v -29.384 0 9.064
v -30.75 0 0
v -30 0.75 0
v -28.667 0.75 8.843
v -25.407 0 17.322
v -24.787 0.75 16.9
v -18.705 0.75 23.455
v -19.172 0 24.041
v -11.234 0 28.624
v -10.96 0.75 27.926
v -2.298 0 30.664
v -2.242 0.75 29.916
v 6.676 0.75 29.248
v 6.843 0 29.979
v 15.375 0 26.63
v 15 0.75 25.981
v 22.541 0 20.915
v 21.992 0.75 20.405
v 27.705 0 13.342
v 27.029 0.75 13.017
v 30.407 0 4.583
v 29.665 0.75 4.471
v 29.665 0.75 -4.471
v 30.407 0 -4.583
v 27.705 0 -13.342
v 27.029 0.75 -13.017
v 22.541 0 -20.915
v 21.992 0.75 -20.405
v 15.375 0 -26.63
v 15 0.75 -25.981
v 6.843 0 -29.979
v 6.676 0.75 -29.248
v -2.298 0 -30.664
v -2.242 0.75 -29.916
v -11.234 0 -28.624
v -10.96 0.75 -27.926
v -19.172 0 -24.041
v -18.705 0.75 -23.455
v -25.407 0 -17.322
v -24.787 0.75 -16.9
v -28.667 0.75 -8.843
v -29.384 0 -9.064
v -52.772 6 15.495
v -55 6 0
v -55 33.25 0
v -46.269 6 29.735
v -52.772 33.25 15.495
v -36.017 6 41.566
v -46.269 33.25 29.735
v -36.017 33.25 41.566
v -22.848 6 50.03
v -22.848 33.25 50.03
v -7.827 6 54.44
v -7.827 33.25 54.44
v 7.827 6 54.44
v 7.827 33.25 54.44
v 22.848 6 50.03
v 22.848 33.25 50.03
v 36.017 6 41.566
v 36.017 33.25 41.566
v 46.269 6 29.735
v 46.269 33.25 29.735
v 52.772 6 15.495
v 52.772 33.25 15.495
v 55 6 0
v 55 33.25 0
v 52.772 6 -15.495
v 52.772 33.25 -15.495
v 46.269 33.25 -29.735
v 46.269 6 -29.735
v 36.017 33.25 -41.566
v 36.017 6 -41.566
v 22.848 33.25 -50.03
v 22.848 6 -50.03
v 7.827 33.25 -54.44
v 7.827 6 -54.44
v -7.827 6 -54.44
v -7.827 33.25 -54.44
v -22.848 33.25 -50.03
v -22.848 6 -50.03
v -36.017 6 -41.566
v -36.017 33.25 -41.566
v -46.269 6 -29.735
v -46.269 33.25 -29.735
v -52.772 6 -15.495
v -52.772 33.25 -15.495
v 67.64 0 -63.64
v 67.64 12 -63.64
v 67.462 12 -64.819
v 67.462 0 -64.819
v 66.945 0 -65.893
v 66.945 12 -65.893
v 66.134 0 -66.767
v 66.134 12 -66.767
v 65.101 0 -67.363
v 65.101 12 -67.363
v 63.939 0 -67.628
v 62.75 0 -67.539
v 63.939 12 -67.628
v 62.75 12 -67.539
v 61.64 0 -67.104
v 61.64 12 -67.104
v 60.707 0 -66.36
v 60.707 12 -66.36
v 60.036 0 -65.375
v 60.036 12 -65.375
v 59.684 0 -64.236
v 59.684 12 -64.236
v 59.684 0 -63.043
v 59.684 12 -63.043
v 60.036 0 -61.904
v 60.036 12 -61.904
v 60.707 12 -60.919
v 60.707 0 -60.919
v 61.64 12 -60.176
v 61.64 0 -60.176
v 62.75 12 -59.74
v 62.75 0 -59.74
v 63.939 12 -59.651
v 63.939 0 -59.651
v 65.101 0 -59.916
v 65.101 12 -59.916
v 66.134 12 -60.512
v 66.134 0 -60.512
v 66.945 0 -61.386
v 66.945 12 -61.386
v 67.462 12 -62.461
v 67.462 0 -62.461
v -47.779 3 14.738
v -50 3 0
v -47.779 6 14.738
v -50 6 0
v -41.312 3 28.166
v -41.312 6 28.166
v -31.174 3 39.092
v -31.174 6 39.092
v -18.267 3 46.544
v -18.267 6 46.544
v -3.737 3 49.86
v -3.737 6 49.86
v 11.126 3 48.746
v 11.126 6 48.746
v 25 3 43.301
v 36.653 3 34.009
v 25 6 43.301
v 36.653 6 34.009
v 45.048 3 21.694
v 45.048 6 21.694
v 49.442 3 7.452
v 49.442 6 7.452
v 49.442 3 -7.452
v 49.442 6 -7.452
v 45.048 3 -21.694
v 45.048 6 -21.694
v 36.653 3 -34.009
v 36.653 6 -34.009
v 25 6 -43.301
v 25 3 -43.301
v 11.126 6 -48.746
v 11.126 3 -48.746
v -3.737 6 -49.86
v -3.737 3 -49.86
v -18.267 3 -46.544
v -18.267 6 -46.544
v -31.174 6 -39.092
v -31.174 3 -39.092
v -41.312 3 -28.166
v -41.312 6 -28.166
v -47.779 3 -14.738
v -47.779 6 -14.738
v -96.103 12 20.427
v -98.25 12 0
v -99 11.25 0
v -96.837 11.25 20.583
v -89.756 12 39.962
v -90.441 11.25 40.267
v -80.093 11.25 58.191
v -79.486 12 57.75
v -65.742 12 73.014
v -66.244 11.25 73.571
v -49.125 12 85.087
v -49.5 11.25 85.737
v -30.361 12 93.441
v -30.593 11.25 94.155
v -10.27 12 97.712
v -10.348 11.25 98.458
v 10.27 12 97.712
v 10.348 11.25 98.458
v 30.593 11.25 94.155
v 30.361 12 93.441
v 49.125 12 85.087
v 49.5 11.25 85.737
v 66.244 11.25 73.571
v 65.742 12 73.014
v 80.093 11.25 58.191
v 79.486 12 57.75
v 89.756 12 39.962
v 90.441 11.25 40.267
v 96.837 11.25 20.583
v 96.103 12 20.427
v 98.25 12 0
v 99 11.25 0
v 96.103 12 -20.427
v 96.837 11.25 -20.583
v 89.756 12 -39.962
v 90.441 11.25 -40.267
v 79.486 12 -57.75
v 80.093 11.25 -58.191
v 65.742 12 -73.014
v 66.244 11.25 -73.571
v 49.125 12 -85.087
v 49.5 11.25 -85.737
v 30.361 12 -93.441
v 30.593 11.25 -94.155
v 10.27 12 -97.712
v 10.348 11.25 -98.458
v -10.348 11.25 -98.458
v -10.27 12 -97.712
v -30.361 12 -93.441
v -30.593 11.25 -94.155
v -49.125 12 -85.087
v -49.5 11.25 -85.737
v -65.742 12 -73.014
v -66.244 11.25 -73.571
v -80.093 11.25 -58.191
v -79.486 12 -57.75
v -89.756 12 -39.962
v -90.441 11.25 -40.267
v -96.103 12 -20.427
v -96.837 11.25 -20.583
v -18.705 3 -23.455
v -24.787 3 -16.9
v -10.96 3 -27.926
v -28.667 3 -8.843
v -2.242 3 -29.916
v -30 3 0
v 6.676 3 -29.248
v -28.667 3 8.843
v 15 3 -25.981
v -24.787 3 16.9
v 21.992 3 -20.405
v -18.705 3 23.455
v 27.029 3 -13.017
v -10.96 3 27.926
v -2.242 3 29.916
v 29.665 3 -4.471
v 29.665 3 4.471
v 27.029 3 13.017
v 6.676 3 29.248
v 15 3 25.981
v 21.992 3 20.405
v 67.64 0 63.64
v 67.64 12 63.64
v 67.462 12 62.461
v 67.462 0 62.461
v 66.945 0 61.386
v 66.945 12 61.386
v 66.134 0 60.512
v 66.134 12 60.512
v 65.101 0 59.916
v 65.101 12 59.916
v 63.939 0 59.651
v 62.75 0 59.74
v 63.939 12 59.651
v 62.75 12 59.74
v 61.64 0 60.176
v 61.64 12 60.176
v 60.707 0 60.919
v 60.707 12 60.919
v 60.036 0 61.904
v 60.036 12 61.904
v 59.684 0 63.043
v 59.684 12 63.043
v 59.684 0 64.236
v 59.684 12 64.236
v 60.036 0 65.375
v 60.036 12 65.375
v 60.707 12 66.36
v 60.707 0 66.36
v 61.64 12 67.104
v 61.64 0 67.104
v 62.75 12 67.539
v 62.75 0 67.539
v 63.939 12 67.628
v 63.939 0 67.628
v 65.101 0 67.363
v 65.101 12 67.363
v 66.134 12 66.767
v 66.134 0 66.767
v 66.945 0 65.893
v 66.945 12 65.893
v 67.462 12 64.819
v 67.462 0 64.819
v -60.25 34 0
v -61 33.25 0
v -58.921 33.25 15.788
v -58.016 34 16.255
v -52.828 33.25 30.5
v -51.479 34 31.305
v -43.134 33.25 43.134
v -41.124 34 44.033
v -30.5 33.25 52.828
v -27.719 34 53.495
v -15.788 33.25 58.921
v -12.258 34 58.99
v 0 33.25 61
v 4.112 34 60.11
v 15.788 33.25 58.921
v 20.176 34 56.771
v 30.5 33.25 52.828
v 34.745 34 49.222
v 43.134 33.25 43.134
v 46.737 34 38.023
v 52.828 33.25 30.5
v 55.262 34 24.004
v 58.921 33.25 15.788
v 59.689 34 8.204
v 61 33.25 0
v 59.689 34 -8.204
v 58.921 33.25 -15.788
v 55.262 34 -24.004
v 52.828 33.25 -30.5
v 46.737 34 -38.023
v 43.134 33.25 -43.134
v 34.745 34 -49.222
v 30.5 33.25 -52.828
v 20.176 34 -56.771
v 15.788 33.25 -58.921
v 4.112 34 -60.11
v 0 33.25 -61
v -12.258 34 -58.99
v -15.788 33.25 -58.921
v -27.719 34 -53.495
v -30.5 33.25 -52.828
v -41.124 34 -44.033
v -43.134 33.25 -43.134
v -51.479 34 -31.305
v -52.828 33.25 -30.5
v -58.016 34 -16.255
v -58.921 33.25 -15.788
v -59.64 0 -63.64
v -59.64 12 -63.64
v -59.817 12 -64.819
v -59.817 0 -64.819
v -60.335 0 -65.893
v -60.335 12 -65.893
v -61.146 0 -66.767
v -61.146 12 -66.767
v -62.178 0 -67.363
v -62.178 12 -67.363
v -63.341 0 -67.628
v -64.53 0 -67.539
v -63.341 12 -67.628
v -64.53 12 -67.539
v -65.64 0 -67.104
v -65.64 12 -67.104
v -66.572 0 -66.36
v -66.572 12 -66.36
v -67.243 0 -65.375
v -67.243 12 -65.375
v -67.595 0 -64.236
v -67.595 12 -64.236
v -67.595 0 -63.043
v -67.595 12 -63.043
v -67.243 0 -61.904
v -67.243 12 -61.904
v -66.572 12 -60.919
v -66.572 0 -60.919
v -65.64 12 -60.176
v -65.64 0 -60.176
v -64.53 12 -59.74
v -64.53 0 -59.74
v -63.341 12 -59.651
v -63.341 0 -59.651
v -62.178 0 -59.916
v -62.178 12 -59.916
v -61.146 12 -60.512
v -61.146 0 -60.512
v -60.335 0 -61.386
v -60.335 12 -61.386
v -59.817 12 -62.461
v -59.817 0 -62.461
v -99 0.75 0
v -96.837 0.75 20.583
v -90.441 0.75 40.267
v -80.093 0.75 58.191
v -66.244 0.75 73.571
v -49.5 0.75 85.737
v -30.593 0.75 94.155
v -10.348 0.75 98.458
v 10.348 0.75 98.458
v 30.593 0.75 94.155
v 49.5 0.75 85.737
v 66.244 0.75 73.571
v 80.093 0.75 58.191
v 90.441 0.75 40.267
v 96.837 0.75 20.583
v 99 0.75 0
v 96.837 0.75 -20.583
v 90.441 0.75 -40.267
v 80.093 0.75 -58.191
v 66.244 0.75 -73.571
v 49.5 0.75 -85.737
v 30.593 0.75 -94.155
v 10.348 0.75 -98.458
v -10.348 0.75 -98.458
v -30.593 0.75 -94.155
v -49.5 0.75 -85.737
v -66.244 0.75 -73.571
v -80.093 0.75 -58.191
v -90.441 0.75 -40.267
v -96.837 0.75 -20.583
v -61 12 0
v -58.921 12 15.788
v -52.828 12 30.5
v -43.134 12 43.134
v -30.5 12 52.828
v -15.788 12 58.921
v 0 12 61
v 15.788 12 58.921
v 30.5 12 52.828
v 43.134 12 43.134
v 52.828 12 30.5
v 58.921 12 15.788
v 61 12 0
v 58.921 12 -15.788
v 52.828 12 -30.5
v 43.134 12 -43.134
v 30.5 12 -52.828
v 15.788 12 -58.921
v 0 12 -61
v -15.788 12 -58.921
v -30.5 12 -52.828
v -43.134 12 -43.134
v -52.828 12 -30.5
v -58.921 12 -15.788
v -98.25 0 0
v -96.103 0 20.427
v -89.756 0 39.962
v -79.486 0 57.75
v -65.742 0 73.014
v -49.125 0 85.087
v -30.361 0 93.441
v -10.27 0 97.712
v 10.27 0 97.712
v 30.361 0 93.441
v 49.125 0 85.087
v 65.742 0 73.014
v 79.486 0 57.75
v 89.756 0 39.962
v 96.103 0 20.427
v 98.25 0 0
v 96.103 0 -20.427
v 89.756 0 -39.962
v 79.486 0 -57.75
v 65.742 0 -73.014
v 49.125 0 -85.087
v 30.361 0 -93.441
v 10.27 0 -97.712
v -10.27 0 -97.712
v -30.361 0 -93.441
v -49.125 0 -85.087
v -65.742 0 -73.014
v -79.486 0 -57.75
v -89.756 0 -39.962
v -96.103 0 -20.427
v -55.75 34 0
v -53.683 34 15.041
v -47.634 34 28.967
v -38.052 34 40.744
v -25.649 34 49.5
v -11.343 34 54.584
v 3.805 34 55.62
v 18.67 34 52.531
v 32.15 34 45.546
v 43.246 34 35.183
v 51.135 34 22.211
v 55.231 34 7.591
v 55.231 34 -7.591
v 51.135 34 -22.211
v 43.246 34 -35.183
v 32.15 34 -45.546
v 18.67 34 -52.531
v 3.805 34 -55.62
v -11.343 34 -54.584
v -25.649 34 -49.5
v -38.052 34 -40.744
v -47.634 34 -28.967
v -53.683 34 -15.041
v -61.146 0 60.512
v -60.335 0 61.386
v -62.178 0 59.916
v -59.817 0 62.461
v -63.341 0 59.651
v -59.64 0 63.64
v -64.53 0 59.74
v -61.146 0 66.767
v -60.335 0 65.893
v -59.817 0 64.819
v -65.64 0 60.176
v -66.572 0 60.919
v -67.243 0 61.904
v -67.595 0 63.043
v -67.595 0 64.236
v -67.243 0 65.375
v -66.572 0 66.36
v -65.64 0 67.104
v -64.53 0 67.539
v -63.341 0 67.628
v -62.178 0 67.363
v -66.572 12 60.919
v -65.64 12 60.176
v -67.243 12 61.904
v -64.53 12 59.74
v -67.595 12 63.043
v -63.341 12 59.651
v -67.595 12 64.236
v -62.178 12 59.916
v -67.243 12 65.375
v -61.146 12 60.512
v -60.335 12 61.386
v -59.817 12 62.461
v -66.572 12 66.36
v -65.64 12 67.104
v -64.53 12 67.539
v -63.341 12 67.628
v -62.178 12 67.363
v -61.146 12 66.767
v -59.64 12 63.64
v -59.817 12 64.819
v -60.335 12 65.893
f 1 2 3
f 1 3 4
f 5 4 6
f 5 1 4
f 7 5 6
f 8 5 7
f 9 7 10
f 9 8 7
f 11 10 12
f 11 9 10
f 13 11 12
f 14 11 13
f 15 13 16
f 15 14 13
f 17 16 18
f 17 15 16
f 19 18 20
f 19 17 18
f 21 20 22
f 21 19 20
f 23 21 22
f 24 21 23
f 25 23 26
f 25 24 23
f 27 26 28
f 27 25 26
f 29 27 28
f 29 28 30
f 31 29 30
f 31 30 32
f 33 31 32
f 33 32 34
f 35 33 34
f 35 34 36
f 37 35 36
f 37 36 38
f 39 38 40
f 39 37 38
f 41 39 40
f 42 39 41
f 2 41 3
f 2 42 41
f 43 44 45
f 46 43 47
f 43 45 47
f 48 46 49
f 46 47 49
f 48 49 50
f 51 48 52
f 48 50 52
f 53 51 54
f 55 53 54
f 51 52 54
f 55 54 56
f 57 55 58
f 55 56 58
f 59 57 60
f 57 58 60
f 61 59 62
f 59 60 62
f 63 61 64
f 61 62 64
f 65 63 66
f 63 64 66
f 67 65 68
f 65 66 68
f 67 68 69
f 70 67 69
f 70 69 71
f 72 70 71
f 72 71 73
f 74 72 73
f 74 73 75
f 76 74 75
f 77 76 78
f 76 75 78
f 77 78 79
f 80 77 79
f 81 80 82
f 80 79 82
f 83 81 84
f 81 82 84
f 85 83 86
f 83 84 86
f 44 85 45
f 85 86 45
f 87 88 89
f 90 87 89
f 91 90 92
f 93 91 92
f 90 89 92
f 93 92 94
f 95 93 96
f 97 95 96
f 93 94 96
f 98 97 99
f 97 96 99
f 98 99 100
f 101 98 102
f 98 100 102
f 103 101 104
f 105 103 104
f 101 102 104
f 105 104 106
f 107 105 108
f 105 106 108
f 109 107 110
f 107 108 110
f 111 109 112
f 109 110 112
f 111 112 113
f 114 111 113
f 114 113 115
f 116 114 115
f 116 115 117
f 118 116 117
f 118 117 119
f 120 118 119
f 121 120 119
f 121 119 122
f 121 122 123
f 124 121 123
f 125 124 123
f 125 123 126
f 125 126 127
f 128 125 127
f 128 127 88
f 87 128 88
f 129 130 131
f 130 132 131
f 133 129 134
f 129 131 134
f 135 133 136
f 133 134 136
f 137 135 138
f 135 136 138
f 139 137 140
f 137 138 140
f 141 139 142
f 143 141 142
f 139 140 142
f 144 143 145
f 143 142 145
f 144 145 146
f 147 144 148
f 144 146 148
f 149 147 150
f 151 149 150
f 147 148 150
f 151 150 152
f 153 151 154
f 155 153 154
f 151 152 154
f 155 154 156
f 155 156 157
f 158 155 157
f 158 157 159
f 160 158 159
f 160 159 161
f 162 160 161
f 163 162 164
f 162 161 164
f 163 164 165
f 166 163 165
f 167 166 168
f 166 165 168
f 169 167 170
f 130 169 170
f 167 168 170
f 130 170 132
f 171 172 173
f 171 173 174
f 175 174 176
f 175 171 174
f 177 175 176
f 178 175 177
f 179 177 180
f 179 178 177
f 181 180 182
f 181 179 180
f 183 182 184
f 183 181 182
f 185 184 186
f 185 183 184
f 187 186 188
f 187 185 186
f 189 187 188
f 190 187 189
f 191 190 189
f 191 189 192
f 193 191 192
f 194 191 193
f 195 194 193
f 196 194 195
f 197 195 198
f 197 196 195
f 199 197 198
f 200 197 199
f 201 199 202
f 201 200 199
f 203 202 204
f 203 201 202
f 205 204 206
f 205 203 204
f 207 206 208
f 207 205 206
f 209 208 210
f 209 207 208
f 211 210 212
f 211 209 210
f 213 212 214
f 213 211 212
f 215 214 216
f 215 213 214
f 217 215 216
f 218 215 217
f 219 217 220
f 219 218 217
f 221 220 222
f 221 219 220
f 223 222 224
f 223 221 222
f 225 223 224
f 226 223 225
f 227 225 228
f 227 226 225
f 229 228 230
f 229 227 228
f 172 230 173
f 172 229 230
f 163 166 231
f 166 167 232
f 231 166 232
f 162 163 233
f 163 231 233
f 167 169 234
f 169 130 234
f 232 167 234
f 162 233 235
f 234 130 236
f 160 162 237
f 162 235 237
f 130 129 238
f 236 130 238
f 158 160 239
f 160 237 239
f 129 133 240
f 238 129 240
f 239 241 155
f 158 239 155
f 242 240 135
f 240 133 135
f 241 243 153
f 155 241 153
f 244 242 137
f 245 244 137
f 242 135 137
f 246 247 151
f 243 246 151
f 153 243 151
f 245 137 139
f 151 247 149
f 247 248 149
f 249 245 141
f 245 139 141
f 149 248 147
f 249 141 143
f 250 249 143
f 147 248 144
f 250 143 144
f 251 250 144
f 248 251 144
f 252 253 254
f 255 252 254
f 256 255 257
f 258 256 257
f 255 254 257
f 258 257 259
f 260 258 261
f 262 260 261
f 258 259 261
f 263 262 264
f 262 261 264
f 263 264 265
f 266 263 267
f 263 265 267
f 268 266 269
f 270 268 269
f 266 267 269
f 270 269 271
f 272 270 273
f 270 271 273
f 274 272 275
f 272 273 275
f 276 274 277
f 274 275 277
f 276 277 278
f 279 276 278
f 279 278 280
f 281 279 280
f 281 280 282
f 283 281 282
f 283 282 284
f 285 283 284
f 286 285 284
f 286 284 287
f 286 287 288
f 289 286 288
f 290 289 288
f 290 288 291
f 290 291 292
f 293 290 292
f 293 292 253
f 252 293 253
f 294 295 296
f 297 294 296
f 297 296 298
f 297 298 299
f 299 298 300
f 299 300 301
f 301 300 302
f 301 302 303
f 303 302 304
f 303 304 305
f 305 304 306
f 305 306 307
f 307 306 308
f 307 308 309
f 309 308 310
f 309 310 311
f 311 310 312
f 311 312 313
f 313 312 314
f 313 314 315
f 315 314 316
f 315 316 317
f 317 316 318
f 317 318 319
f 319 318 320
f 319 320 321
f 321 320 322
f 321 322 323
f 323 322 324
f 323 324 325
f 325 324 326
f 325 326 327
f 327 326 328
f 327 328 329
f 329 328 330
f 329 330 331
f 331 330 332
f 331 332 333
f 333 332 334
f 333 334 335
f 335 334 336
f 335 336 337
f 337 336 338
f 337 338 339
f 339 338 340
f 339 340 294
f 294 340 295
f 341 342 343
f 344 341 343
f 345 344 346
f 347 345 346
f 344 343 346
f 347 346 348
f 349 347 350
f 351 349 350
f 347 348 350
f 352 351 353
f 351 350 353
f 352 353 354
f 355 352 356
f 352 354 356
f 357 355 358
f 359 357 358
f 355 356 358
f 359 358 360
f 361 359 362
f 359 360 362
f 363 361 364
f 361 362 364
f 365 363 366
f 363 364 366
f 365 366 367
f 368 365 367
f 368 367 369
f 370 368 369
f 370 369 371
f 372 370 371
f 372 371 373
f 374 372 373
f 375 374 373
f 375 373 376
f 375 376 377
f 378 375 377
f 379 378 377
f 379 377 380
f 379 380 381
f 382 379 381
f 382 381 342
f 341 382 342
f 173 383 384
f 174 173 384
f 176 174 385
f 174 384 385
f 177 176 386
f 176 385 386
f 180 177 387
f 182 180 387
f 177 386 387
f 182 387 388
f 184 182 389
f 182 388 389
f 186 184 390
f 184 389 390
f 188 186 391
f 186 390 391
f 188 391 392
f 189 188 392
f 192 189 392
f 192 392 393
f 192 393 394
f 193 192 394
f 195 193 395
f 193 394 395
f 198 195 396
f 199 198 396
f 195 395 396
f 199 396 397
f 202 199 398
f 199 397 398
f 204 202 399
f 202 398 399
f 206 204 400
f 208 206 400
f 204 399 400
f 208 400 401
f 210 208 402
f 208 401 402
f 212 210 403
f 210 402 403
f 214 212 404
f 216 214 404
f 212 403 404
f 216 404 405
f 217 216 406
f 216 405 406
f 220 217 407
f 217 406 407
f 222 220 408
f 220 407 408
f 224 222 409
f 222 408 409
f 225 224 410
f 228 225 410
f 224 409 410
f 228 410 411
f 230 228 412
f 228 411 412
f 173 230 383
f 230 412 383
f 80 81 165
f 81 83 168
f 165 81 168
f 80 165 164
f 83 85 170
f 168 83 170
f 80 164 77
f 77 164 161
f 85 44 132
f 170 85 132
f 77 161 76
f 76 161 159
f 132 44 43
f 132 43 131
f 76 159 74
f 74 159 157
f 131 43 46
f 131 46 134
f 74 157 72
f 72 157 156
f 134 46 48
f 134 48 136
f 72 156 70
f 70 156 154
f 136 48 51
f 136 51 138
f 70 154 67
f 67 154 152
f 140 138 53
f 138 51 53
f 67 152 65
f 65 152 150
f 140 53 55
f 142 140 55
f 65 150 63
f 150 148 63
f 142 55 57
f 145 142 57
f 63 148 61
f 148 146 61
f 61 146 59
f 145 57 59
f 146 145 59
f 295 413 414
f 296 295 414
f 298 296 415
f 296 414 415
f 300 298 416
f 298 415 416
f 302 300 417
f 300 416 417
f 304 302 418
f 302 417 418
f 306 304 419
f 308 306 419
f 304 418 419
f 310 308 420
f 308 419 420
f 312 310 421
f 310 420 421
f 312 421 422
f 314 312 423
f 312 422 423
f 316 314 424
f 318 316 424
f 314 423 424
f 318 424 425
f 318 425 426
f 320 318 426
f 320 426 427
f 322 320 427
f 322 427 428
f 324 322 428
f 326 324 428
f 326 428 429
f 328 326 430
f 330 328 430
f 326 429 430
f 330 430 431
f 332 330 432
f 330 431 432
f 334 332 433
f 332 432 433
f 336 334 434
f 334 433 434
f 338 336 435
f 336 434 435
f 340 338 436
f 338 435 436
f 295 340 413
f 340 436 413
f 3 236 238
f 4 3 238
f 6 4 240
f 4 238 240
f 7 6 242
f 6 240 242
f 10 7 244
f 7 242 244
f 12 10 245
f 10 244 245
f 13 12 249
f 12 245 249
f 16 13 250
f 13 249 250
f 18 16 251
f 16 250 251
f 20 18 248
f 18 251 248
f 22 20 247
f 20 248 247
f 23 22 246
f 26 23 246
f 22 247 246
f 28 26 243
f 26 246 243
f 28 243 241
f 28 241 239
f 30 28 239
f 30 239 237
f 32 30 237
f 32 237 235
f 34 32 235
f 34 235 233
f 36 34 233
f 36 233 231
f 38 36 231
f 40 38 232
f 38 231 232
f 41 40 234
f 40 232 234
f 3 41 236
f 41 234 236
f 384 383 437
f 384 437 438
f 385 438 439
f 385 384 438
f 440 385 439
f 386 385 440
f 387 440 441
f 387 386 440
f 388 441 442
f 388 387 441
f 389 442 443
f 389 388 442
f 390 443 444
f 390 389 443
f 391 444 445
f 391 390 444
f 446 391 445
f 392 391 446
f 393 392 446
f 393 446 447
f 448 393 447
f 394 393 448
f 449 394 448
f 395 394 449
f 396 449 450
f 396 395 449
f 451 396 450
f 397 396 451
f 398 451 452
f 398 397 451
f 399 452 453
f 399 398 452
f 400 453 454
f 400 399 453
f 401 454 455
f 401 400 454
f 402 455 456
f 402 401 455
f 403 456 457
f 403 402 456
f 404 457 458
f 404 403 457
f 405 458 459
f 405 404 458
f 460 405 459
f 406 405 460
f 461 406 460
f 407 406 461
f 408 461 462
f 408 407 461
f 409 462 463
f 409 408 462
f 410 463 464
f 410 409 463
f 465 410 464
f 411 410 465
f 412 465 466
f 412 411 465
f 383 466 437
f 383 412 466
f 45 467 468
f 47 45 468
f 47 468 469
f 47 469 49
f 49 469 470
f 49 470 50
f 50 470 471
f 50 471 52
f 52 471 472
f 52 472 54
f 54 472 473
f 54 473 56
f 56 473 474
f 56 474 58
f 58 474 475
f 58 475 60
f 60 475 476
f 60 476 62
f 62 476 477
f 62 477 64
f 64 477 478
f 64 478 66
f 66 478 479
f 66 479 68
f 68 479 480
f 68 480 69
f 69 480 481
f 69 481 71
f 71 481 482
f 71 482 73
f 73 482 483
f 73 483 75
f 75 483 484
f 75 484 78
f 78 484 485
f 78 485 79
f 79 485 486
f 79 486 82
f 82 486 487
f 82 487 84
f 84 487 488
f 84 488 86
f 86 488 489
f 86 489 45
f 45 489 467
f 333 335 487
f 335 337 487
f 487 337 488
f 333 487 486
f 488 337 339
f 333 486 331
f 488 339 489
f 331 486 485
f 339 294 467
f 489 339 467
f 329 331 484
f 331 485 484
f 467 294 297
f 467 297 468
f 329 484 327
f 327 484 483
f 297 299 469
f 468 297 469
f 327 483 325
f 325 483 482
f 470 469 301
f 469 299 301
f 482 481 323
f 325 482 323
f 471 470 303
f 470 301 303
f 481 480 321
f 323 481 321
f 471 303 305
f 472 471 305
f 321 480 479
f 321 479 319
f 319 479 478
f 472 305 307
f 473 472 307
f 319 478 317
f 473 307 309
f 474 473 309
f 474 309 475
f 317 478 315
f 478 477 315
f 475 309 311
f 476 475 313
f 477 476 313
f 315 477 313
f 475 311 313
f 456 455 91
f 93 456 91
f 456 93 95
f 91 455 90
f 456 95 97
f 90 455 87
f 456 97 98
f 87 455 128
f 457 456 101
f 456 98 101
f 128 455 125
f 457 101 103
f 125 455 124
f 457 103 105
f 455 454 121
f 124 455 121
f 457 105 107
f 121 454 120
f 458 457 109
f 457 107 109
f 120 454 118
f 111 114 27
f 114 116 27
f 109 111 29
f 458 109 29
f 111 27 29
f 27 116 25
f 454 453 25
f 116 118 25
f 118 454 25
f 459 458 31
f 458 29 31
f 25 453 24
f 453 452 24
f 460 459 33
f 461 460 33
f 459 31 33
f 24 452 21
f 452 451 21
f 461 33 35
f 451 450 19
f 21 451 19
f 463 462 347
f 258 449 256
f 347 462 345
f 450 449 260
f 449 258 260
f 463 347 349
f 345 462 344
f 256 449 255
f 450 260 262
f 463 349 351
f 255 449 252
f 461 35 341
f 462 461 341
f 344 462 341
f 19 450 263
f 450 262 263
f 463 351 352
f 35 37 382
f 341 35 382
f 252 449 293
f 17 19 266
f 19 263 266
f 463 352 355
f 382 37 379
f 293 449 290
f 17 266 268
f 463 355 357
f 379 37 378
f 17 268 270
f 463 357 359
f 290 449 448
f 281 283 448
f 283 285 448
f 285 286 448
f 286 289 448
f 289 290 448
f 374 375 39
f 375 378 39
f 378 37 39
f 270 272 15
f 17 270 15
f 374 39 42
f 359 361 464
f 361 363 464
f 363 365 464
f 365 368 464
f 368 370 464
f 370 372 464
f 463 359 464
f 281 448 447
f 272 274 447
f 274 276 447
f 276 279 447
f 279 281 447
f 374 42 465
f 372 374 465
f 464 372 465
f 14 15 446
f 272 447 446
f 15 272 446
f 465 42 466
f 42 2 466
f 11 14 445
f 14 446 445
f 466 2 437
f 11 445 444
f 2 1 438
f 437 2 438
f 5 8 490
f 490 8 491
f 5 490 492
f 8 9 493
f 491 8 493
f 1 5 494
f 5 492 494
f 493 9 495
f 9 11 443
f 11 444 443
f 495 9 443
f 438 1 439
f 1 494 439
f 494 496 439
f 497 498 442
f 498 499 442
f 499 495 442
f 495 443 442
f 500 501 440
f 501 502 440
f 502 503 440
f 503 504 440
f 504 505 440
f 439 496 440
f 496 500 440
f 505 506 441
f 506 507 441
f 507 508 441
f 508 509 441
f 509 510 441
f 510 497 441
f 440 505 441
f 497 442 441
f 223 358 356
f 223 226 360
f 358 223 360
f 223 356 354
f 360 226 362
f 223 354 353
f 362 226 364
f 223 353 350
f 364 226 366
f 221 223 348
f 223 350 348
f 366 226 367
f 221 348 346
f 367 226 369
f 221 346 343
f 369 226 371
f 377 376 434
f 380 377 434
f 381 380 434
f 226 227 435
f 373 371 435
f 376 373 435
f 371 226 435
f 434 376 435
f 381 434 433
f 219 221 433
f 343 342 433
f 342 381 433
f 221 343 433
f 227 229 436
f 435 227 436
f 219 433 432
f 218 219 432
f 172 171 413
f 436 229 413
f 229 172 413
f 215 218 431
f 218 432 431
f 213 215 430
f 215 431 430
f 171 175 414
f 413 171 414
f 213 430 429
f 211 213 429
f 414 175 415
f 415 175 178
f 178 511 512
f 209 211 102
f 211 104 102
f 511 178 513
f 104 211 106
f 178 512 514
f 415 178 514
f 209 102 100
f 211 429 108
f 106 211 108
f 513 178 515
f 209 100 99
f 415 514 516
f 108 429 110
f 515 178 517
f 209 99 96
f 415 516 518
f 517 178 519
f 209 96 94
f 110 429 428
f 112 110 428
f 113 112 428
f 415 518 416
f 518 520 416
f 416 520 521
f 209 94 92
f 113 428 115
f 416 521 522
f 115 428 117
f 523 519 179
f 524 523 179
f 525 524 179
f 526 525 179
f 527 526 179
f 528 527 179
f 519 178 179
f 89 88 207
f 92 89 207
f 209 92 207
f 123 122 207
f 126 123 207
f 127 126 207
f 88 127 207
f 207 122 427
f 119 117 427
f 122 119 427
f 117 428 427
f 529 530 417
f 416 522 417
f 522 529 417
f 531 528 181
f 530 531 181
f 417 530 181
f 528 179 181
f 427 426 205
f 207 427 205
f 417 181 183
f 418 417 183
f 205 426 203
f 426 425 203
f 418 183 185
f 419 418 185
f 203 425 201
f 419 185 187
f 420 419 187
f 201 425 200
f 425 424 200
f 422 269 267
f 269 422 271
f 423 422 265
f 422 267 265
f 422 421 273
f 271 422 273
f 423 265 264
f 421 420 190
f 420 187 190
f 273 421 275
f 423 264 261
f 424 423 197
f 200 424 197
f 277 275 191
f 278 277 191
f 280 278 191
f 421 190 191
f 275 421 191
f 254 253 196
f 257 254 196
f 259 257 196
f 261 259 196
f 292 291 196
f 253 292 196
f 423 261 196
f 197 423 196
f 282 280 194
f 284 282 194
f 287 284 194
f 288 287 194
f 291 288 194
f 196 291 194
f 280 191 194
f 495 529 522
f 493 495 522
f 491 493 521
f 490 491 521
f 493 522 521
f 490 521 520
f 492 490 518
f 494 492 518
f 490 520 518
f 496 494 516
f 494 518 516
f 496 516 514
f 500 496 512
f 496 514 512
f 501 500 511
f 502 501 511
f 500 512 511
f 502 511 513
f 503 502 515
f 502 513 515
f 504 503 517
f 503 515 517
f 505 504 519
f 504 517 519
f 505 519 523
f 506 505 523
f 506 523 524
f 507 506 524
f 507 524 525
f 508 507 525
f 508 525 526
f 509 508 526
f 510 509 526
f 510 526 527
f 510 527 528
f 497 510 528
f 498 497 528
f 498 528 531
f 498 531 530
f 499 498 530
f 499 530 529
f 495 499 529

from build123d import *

# Parameters (mm, degrees)
CUT_EXTRUDE1_REACH = 14
SKETCH2_R          = 4
CHAMFER1_SIZE      = 0.75


with BuildPart() as part:
    # Sketch1 → Revolve2 (revolve)
    with BuildSketch(Plane.XY):
        Polygon((-50, 3), (-50, 6), (-55, 6), (-55, 34), (-61, 34), (-61, 12), (-99, 12), (-99, 0), (-30, 0), (-30, 3), align=None)
    revolve(axis=Axis((0, 0, 0), (0, 1, 0)))

    # Sketch2 → Cut-Extrude1 (cut, up to next)
    with BuildSketch(Plane(origin=(0, 12, 0), x_dir=(1, 0, 0), z_dir=(0, 1, 0)), mode=Mode.PRIVATE) as cut_extrude1_sk1:
        with Locations((-63.639610307, 63.639610307)):
            Circle(SKETCH2_R)
    cut_extrude1_tool1 = extrude(cut_extrude1_sk1.sketch, amount=-CUT_EXTRUDE1_REACH, mode=Mode.PRIVATE) & part.part
    add(cut_extrude1_tool1.solids().sort_by_distance((-63.63961, 12, -63.63961))[0], mode=Mode.SUBTRACT)
    # Sketch2 → Cut-Extrude1 (cut, up to next)
    with BuildSketch(Plane(origin=(0, 12, 0), x_dir=(1, 0, 0), z_dir=(0, 1, 0)), mode=Mode.PRIVATE) as cut_extrude1_sk2:
        with Locations((63.639610307, 63.639610307)):
            Circle(SKETCH2_R)
    cut_extrude1_tool2 = extrude(cut_extrude1_sk2.sketch, amount=-CUT_EXTRUDE1_REACH, mode=Mode.PRIVATE) & part.part
    add(cut_extrude1_tool2.solids().sort_by_distance((63.63961, 12, -63.63961))[0], mode=Mode.SUBTRACT)
    # Sketch2 → Cut-Extrude1 (cut, up to next)
    with BuildSketch(Plane(origin=(0, 12, 0), x_dir=(1, 0, 0), z_dir=(0, 1, 0)), mode=Mode.PRIVATE) as cut_extrude1_sk3:
        with Locations((63.639610307, -63.639610307)):
            Circle(SKETCH2_R)
    cut_extrude1_tool3 = extrude(cut_extrude1_sk3.sketch, amount=-CUT_EXTRUDE1_REACH, mode=Mode.PRIVATE) & part.part
    add(cut_extrude1_tool3.solids().sort_by_distance((63.63961, 12, 63.63961))[0], mode=Mode.SUBTRACT)
    # Sketch2 → Cut-Extrude1 (cut, up to next)
    with BuildSketch(Plane(origin=(0, 12, 0), x_dir=(1, 0, 0), z_dir=(0, 1, 0)), mode=Mode.PRIVATE) as cut_extrude1_sk4:
        with Locations((-63.639610307, -63.639610307)):
            Circle(SKETCH2_R)
    cut_extrude1_tool4 = extrude(cut_extrude1_sk4.sketch, amount=-CUT_EXTRUDE1_REACH, mode=Mode.PRIVATE) & part.part
    add(cut_extrude1_tool4.solids().sort_by_distance((-63.63961, 12, 63.63961))[0], mode=Mode.SUBTRACT)

    # Chamfer1
    chamfer1_edges = [part.edges().sort_by_distance(p)[0] for p in [
        (55, 34, 0),
        (61, 34, 0),
        (99, 12, 0),
        (99, 0, 0),
        (30, 0, 0),
    ]]
    chamfer(chamfer1_edges, length=CHAMFER1_SIZE)


solid = part.part
